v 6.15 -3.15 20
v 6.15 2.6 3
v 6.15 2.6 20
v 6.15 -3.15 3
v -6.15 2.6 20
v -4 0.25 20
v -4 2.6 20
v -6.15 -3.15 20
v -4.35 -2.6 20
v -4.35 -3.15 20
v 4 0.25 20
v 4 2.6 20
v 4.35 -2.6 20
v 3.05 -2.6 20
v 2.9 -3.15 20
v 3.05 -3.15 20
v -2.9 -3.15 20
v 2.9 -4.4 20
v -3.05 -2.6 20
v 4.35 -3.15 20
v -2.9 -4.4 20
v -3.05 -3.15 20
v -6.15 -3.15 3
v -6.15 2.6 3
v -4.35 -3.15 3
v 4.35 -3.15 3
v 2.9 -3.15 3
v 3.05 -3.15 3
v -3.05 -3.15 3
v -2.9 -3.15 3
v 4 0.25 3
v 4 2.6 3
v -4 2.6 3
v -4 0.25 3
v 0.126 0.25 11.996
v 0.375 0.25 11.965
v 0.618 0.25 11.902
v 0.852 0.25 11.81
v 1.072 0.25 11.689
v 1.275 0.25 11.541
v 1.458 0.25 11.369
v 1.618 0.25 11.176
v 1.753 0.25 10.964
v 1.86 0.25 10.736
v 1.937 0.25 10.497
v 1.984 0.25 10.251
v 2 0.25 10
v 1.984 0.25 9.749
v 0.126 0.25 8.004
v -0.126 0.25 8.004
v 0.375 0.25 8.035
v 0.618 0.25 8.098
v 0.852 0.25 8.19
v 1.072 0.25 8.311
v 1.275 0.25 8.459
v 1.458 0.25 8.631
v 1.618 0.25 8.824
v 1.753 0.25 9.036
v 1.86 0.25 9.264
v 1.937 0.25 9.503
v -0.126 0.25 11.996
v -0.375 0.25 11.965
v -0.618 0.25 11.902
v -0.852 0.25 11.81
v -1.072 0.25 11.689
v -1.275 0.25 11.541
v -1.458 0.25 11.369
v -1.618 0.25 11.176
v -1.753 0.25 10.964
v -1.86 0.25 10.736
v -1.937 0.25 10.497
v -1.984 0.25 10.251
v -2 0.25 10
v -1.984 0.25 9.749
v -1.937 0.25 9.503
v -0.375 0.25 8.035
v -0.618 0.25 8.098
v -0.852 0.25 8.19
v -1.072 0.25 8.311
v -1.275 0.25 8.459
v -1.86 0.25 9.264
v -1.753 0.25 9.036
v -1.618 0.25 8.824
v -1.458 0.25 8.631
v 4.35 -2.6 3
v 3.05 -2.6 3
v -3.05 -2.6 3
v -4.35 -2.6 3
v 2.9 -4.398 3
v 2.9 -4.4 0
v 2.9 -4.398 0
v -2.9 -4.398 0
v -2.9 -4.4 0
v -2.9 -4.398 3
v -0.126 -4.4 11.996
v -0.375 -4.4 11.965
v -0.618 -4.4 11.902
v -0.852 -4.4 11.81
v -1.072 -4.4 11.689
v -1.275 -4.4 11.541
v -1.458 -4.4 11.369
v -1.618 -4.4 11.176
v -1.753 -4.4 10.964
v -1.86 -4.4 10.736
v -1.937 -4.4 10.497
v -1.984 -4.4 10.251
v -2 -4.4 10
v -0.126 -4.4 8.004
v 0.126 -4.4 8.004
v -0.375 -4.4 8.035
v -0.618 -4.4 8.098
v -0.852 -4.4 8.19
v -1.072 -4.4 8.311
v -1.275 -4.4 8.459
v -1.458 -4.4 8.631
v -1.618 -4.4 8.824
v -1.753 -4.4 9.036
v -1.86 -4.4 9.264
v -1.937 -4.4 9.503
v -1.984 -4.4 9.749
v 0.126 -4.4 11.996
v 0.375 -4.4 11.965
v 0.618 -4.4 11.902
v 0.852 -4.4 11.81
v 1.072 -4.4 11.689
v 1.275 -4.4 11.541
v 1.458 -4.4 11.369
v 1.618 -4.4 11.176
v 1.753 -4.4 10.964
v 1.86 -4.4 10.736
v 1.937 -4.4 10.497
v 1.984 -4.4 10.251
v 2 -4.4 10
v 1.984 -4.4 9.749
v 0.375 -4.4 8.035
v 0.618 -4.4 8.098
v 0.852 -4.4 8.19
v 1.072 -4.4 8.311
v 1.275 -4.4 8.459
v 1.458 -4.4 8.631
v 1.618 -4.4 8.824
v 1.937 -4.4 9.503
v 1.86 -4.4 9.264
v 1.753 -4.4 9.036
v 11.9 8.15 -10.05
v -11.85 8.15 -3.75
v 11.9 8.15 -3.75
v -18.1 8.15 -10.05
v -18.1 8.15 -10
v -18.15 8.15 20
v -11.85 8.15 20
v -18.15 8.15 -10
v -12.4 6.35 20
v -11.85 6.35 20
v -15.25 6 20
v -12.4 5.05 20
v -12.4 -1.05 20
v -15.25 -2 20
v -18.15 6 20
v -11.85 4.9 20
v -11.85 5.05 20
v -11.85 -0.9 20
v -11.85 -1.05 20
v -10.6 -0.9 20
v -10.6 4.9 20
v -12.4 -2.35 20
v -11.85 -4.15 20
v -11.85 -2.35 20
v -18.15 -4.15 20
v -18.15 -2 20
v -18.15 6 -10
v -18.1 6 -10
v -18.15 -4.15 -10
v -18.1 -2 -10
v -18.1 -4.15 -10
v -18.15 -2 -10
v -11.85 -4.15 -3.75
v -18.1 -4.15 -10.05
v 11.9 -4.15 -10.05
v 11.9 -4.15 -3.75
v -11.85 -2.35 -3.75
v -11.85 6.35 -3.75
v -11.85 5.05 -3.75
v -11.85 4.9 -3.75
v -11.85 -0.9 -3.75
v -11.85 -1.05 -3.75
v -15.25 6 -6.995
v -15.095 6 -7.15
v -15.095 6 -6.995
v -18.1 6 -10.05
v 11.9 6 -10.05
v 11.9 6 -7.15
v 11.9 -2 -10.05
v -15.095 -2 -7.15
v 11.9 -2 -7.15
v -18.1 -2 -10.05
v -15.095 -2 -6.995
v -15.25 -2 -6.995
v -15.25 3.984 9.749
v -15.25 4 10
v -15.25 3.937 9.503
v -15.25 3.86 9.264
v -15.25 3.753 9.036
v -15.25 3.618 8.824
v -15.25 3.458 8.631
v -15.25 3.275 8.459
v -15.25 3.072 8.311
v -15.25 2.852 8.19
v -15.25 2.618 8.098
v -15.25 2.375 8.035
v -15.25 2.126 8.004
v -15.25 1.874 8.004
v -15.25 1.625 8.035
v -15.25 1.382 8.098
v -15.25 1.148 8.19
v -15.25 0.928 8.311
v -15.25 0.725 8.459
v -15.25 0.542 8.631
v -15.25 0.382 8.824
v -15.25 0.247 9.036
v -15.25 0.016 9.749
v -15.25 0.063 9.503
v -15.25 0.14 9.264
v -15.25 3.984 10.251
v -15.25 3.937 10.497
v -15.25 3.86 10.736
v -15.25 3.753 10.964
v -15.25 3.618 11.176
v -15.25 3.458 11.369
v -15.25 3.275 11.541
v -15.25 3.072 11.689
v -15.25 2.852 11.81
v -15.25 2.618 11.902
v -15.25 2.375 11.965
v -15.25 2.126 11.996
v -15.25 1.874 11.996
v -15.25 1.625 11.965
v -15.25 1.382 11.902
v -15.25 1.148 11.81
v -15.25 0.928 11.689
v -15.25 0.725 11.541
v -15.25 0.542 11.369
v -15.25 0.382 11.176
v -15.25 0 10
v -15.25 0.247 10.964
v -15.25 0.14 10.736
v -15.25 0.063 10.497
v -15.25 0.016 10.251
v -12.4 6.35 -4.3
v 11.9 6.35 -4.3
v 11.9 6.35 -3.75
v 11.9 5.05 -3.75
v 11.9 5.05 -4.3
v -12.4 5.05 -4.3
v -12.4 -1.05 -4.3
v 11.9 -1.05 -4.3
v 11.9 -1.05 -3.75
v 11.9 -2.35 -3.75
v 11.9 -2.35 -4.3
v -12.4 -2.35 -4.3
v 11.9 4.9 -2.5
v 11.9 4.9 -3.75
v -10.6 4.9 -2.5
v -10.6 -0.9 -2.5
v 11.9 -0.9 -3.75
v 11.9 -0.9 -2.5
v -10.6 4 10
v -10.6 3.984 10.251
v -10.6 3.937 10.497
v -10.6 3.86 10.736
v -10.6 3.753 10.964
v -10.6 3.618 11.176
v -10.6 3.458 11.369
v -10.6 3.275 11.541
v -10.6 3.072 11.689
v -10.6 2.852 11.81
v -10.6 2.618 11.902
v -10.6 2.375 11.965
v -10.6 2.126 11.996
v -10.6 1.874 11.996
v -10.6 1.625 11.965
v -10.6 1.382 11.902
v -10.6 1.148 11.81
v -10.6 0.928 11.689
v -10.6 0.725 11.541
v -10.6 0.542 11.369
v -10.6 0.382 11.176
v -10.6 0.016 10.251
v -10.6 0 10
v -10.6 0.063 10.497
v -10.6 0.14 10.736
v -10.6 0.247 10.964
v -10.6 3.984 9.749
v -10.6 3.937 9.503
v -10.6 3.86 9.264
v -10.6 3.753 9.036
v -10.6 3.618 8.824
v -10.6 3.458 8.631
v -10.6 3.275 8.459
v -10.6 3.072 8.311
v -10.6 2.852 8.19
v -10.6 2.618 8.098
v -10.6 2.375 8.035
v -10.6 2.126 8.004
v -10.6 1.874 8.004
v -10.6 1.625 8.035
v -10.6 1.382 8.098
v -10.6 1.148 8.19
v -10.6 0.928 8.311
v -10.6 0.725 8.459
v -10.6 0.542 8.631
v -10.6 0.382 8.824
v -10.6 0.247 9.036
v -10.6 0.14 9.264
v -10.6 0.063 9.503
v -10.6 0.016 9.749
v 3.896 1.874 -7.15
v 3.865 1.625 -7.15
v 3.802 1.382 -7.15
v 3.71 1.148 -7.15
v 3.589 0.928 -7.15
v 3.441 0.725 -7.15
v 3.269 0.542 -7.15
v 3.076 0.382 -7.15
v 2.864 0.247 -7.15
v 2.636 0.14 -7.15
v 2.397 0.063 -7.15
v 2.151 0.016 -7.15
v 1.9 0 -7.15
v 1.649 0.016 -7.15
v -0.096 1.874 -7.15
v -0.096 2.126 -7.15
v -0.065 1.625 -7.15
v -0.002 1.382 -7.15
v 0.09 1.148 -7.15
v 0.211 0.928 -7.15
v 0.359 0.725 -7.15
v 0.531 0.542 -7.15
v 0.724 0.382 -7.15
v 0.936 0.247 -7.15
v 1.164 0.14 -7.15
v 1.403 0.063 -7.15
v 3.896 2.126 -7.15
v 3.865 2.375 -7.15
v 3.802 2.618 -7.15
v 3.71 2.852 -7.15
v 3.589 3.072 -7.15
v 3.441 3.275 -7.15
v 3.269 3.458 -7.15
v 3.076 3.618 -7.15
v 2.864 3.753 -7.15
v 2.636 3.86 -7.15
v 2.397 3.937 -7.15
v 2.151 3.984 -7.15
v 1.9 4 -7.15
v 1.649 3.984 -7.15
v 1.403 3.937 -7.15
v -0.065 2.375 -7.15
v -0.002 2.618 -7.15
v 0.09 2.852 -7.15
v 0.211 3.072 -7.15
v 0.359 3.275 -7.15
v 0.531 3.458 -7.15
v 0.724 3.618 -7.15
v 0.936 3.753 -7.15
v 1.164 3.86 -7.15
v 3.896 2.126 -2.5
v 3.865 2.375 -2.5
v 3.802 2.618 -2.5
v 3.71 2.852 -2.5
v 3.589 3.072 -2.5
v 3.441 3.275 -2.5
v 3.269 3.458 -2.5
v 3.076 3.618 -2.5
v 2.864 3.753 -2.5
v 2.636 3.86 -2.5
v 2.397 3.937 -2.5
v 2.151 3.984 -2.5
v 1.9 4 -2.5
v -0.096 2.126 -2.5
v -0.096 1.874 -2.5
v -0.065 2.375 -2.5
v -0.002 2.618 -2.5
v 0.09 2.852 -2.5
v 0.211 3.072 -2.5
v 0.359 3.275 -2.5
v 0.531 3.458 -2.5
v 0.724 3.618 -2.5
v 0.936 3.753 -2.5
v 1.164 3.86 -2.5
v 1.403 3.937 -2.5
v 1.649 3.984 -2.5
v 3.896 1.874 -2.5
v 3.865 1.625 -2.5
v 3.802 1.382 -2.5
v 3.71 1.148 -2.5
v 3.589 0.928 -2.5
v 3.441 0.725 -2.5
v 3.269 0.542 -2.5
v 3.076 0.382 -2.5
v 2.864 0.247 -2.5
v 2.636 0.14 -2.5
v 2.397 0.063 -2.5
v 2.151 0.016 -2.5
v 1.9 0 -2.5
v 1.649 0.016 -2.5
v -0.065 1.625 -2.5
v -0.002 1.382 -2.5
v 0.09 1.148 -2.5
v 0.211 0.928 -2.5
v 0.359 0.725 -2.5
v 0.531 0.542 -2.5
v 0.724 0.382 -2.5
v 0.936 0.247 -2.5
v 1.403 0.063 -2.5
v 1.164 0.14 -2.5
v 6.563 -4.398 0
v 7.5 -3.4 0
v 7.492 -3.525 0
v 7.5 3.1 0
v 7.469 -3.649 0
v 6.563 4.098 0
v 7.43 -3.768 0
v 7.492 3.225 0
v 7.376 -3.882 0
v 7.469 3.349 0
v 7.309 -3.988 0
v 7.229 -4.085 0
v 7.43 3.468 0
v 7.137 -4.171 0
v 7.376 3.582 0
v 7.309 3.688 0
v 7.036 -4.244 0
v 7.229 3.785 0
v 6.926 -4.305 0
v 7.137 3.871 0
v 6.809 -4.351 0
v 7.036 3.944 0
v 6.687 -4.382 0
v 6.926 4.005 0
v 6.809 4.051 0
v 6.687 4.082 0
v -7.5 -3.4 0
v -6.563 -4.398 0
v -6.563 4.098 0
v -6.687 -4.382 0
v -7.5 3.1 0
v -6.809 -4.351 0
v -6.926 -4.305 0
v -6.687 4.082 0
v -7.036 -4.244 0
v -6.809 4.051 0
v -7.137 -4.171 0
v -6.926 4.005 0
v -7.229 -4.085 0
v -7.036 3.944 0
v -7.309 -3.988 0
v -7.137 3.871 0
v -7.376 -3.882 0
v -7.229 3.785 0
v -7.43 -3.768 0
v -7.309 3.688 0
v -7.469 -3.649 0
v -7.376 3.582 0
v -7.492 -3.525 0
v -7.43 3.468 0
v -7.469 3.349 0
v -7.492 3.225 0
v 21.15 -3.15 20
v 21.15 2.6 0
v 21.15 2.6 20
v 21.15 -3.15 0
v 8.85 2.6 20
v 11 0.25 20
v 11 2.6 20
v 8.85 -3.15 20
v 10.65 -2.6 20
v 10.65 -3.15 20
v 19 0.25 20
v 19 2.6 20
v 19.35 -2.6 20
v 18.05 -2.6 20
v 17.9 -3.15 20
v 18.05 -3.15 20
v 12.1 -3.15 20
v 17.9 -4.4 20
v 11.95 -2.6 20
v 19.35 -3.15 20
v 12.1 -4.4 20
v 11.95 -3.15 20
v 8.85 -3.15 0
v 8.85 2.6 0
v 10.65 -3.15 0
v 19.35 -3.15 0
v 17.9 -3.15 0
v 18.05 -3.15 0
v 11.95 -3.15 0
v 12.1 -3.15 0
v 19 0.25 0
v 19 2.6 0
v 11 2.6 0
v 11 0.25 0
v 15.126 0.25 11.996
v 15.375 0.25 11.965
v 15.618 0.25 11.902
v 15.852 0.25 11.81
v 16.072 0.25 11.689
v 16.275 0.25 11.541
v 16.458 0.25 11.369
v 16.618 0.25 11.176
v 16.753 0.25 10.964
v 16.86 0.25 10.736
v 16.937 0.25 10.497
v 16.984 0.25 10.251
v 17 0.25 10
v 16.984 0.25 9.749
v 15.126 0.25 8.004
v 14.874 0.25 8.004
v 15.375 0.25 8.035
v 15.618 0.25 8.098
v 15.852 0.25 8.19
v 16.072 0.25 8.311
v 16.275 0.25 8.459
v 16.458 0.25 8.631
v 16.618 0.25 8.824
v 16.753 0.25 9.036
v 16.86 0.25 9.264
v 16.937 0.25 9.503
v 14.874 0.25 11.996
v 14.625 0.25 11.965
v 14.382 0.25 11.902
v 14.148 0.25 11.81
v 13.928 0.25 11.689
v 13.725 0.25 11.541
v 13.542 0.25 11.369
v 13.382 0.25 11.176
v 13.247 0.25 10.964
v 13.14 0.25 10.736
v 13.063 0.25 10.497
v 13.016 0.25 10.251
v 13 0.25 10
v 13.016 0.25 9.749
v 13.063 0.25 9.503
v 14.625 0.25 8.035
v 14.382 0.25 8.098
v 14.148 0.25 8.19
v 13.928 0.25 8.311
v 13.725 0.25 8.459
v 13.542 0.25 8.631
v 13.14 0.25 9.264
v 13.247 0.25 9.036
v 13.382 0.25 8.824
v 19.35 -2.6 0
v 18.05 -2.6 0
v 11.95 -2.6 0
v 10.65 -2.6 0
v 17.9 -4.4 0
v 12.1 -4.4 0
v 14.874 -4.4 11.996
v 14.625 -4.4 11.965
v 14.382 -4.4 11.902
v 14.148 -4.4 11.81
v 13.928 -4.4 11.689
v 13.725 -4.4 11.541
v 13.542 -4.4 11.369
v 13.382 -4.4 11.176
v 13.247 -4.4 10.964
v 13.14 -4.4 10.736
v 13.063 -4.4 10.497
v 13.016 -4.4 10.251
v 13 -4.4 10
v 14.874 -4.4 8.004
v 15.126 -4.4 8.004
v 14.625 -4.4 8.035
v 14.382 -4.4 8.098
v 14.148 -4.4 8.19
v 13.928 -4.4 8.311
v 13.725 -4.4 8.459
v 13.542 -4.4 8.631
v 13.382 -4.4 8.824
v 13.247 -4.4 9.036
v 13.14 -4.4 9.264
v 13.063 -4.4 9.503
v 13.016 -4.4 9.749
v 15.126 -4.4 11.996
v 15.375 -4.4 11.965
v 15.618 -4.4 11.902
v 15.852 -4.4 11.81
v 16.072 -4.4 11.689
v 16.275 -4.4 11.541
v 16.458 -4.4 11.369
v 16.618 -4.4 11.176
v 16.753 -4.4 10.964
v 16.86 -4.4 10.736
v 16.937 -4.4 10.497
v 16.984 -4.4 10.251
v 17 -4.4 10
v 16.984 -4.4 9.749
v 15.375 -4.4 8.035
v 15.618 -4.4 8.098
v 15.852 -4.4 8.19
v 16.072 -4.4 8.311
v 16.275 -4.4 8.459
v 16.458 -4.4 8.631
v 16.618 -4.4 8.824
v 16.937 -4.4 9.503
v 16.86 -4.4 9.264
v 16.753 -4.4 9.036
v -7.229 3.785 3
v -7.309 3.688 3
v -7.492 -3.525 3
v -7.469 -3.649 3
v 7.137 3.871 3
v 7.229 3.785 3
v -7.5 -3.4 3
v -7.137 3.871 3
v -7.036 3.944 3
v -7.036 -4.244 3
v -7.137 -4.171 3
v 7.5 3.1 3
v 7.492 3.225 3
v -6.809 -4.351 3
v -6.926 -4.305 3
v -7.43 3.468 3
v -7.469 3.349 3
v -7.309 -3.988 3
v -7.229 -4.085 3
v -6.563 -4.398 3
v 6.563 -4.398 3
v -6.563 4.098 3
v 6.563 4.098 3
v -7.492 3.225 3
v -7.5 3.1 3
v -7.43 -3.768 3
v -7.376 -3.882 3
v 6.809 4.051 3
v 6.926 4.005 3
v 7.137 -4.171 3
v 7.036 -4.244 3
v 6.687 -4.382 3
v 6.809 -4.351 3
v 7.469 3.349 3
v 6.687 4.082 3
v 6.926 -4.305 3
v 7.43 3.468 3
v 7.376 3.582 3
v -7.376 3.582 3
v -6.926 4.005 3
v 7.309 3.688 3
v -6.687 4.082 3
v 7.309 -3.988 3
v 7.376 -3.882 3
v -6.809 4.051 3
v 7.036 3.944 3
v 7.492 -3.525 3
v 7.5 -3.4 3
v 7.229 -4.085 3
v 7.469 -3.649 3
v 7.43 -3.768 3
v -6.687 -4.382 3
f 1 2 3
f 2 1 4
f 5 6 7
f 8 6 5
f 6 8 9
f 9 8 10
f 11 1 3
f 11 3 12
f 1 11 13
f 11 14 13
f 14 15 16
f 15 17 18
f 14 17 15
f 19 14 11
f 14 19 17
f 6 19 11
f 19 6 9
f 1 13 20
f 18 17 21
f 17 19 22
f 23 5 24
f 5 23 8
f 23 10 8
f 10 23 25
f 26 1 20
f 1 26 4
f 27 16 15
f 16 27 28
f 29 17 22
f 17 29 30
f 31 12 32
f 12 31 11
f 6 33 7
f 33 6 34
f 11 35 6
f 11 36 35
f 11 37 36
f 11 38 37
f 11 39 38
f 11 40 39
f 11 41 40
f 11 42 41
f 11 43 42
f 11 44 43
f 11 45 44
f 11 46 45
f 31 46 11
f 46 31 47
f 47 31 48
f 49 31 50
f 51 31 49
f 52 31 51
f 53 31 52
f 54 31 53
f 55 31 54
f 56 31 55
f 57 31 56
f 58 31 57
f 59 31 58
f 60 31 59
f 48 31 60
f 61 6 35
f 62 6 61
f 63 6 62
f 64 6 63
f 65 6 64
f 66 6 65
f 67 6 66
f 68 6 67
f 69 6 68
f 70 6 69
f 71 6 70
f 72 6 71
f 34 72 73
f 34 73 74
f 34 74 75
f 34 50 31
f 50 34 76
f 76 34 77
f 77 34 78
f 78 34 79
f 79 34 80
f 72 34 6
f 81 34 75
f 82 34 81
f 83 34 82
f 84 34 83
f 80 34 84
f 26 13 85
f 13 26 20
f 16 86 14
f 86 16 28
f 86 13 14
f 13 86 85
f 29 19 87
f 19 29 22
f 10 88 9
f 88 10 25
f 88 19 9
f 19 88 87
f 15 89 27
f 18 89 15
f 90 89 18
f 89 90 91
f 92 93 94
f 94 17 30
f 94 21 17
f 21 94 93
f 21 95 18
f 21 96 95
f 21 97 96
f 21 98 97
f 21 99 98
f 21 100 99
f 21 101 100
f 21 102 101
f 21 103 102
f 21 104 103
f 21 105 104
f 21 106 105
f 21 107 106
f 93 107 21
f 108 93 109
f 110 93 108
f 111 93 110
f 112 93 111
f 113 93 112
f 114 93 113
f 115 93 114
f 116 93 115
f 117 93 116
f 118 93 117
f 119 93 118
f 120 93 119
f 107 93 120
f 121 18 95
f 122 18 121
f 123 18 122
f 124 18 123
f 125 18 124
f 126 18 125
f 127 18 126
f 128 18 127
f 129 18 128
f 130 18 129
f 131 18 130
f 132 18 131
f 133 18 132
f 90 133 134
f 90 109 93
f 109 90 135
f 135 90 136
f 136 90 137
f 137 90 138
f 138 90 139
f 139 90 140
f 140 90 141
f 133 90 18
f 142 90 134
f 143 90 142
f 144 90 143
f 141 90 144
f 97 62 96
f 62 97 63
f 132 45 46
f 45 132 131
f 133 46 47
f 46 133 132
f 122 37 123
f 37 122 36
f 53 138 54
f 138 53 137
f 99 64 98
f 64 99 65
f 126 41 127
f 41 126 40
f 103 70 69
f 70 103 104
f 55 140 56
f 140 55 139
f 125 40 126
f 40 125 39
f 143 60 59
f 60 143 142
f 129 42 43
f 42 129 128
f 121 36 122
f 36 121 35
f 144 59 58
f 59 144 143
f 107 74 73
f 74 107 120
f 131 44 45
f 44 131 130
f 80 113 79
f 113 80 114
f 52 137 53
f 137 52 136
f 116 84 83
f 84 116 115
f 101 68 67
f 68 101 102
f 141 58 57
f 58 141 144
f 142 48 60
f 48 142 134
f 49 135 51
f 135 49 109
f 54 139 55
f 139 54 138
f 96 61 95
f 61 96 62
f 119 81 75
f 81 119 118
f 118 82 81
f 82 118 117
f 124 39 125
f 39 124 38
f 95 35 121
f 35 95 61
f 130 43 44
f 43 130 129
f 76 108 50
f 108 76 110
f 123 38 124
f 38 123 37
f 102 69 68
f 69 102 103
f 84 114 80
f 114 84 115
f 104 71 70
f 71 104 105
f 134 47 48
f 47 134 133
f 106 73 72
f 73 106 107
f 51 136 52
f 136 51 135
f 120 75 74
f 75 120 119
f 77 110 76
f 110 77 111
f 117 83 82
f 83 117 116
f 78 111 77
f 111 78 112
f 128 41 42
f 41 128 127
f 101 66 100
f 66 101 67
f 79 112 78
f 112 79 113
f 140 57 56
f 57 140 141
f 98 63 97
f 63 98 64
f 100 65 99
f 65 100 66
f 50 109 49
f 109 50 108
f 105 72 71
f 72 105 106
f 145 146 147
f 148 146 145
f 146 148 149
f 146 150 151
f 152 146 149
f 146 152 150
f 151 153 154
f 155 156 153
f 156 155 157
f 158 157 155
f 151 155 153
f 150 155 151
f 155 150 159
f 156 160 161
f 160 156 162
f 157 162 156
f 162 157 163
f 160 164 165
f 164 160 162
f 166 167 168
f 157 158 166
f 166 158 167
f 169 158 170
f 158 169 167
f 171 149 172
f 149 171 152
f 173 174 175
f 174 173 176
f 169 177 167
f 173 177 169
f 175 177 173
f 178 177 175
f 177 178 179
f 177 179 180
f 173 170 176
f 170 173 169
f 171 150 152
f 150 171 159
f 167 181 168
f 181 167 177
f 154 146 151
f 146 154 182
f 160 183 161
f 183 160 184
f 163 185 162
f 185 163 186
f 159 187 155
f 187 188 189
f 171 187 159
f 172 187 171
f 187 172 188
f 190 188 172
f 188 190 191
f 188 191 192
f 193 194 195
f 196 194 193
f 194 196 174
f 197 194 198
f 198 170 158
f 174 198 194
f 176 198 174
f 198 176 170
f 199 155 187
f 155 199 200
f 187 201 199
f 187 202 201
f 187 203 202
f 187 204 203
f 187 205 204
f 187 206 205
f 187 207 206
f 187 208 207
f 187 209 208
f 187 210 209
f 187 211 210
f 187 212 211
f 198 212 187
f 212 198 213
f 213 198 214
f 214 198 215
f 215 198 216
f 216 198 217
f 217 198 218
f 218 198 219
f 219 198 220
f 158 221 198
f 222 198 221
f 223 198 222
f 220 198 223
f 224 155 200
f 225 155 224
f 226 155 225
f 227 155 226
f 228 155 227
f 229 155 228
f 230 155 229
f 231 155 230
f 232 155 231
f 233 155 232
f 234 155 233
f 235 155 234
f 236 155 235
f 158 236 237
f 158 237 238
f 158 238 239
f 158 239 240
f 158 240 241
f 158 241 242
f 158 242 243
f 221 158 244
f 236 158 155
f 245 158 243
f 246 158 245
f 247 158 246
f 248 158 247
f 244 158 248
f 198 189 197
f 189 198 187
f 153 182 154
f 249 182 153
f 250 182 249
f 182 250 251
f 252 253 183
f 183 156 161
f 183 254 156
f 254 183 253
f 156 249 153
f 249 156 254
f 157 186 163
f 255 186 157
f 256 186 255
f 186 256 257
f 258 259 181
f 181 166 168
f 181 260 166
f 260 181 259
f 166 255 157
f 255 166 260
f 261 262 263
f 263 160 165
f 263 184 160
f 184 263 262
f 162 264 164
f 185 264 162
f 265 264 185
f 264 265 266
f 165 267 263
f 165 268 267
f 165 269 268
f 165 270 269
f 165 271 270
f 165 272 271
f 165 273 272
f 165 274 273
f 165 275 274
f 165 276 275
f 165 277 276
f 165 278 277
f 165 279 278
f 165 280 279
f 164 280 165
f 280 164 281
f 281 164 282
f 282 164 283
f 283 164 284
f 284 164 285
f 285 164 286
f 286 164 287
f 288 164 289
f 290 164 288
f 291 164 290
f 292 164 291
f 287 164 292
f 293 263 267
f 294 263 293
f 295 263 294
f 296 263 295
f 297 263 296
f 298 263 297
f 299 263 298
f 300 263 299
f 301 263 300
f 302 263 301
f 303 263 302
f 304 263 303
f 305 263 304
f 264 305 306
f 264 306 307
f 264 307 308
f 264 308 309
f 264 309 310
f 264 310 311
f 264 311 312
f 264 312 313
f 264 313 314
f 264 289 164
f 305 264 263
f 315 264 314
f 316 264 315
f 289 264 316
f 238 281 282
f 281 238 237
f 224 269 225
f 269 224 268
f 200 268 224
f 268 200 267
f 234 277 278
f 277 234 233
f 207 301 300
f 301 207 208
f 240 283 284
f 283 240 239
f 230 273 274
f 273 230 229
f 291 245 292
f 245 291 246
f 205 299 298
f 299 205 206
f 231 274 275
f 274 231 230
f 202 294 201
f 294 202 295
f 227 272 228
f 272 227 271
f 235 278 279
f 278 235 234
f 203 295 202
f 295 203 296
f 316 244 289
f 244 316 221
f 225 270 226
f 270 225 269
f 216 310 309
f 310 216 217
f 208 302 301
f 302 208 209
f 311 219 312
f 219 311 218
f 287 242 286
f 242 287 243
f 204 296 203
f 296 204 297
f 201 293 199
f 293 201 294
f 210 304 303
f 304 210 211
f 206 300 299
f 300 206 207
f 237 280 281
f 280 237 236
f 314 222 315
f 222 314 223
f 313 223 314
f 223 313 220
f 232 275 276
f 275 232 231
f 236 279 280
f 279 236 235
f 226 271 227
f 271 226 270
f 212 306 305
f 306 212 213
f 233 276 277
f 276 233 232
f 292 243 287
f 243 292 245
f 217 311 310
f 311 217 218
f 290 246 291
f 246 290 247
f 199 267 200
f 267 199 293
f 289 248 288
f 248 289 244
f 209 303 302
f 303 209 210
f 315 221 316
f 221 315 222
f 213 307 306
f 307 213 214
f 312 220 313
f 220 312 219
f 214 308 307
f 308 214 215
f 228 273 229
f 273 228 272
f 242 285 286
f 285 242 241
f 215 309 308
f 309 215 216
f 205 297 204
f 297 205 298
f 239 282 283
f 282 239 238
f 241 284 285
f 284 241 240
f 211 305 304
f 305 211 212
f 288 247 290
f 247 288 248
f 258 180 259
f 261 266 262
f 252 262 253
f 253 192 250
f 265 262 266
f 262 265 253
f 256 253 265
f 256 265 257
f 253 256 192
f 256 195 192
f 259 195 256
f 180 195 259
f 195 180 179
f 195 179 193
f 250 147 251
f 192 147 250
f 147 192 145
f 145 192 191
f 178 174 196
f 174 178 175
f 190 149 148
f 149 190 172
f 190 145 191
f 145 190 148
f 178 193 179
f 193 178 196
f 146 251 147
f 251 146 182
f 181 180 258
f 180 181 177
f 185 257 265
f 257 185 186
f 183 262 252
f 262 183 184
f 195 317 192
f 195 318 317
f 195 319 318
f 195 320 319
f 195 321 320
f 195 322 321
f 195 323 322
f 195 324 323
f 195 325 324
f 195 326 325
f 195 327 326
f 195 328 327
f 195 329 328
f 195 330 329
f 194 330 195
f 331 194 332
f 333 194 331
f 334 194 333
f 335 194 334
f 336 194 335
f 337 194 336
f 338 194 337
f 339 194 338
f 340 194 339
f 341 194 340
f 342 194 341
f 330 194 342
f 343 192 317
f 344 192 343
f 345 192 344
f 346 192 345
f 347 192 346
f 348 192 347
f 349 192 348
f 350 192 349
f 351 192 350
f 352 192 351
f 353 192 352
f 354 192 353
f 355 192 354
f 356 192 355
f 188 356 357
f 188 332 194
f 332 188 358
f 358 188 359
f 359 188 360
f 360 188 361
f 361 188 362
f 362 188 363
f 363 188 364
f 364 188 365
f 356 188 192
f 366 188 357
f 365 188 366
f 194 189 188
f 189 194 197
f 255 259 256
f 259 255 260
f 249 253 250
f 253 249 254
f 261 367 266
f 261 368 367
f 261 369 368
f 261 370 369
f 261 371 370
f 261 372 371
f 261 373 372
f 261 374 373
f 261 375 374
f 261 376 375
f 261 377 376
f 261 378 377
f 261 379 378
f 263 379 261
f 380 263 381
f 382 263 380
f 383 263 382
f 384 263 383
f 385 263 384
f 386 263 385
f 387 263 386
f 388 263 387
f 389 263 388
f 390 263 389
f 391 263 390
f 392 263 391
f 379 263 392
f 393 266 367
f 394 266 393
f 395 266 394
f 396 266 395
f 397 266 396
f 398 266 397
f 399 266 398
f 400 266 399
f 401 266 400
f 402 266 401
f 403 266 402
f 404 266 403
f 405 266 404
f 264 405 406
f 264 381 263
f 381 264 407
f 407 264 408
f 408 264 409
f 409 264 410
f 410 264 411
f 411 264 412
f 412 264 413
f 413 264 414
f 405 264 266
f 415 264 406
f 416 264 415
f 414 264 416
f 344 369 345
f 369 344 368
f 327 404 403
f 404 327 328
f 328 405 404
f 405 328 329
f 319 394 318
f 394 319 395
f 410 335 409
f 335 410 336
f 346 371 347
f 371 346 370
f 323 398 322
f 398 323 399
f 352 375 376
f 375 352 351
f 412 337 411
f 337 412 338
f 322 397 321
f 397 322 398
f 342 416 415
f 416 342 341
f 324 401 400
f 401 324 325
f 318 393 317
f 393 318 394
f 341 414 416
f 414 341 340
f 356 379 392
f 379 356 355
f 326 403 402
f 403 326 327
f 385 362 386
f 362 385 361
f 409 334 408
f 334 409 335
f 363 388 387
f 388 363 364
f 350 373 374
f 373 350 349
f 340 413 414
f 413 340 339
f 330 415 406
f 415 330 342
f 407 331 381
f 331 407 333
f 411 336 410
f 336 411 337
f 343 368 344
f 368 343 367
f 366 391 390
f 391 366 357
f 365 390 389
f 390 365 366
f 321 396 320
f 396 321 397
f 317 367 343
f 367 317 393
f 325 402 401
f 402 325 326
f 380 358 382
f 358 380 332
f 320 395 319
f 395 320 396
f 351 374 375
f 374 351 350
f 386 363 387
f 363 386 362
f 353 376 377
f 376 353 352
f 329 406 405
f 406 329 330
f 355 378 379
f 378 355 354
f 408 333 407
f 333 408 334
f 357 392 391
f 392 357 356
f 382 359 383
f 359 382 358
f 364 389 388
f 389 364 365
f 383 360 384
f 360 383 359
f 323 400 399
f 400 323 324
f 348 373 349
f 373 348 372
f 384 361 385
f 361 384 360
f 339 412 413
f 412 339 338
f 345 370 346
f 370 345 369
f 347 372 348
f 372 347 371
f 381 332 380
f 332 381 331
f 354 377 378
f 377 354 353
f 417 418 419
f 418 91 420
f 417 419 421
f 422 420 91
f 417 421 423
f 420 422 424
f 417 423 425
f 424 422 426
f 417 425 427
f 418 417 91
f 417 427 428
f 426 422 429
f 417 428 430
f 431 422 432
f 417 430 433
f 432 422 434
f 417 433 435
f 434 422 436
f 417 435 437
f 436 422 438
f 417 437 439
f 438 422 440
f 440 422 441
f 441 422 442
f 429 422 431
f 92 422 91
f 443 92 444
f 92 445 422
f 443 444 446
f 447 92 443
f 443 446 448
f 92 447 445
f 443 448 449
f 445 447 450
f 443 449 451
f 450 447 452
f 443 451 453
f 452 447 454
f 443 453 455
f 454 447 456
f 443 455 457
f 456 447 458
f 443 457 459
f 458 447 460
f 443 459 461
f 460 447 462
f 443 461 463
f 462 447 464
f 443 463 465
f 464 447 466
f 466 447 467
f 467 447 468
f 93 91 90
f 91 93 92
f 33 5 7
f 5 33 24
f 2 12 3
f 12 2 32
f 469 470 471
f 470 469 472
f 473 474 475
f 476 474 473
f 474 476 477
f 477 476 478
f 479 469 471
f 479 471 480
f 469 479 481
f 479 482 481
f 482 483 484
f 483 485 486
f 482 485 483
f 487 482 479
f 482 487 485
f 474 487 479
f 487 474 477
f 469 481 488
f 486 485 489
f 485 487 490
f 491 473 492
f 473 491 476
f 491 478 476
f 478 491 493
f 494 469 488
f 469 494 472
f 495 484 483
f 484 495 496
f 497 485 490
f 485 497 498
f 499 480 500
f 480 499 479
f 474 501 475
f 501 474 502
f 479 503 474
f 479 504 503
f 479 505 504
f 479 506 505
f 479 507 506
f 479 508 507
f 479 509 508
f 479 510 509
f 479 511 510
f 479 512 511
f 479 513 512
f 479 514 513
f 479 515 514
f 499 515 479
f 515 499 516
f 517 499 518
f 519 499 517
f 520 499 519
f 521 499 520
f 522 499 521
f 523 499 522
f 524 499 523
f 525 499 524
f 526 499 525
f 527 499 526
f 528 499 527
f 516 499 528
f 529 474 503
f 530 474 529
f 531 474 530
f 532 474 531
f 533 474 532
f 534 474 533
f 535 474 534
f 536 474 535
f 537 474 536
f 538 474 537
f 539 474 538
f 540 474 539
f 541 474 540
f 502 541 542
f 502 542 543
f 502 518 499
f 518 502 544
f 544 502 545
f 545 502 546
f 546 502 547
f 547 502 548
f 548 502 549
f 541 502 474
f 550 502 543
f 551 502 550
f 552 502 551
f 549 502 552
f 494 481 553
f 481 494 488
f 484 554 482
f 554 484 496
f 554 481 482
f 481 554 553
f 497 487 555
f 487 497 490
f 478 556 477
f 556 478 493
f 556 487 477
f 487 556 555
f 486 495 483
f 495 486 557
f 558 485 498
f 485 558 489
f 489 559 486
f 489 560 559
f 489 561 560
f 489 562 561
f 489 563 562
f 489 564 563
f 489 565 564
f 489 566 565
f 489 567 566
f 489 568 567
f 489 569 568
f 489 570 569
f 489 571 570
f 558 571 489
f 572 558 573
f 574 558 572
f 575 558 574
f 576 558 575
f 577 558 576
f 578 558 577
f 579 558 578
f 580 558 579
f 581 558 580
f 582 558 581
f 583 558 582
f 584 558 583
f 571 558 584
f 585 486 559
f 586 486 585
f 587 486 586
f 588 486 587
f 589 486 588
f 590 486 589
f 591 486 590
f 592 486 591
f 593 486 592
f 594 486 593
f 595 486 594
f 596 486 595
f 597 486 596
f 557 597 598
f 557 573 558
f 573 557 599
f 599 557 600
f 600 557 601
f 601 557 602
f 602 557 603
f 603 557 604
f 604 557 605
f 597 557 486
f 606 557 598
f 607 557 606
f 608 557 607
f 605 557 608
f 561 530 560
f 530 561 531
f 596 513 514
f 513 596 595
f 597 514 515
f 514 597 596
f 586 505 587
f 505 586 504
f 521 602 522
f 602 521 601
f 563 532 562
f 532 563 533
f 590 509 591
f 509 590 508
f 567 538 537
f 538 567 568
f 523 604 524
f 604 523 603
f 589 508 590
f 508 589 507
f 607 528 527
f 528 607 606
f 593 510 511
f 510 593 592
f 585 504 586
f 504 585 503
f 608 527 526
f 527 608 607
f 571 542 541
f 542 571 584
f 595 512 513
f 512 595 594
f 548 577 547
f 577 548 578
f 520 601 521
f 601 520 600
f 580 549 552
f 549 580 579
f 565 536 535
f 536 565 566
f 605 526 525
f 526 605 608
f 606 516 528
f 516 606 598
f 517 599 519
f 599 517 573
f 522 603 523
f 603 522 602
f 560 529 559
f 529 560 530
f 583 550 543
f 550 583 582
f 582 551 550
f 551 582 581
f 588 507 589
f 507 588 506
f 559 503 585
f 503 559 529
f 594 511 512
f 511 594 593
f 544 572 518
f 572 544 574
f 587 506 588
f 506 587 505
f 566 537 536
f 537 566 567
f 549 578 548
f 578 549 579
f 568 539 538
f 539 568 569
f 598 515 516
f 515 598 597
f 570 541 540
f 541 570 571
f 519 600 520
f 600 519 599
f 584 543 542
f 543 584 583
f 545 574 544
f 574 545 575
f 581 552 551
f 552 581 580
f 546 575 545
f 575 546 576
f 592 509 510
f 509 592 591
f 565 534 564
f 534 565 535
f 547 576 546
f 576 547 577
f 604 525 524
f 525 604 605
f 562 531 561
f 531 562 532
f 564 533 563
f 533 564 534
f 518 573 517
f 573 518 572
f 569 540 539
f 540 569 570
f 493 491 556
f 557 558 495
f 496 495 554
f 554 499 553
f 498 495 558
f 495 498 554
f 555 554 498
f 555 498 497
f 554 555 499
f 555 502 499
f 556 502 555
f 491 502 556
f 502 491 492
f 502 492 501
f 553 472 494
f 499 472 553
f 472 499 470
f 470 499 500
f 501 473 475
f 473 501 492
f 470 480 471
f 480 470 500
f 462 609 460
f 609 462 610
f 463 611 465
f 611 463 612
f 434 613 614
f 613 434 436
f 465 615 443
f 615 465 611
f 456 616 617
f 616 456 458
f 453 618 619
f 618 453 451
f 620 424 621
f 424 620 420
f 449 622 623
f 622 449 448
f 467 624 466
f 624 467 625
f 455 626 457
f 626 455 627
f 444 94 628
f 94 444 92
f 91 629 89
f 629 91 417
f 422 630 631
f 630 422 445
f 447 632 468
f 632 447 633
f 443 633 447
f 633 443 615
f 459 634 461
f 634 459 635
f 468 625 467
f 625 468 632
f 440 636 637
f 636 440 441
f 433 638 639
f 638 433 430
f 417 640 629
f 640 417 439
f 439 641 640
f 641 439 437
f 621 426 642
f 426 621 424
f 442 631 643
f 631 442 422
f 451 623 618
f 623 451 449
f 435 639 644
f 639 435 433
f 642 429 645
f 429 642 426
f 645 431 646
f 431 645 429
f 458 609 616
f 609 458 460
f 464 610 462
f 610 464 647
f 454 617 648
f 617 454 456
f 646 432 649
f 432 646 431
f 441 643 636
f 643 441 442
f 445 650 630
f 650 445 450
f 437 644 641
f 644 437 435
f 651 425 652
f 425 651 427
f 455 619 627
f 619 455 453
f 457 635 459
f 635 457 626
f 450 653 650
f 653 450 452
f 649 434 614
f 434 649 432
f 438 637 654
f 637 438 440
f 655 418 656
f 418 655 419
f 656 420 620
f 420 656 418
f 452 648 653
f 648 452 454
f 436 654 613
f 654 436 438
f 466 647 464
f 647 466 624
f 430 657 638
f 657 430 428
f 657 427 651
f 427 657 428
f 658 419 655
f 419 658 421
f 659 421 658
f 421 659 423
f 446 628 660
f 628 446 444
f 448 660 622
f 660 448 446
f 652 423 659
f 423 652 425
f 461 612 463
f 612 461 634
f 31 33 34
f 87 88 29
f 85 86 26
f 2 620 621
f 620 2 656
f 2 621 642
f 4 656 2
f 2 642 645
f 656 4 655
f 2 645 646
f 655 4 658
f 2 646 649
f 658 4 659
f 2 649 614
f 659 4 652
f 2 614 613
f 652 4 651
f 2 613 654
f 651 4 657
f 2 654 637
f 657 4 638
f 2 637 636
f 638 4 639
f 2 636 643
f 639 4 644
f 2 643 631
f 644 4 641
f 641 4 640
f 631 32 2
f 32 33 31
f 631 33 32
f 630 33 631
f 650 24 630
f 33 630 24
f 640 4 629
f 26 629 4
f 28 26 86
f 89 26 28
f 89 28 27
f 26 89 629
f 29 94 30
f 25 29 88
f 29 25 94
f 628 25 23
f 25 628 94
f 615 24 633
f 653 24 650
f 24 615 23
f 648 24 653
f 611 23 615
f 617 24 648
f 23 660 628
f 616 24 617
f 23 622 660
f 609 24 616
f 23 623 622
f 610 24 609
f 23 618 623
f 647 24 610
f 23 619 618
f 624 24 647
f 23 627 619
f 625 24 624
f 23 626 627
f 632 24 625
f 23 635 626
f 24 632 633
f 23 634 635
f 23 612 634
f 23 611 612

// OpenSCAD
$fn = 50 * 1;

// Draw corner piece
draw_corner_piece = "yes"; // [yes, no]

// Draw end stop
draw_end_stop = "yes"; // [yes, no]

// Draw straight stop
draw_straight_piece = "yes"; // [yes, no]


module roundedRect(size, radius) {
  x = size[0];
  y = size[1];
  z = size[2];

  linear_extrude(height=z)
  hull() {
  translate([radius, radius, 0])
  circle(r=radius);

  translate([x - radius, radius, 0])
  circle(r=radius);

  translate([x - radius, y - radius, 0])
  circle(r=radius);

  translate([radius, y - radius, 0])
  circle(r=radius);
  }
}

module part() {
  difference() {
    translate([0, 0, 5])
      cube([12.3, 6.3, 30], center=true);
    translate([0, 3.3/2+0.1, 5])
      cube([8, 3, 30.1], center=true);
    translate([0, 0, -10+3/2])
      cube([8, 6.3+1, 3.01], center=true);
    translate([12.3/2 - 1.3/2 - 1.8, -6.3/2+0.5/2, 3+5])
      cube([1.3, 0.5 + 0.1, 25], center=true);
    translate([-12.3/2 + 1.3/2 + 1.8, -6.3/2+0.5/2, 3+5])
      cube([1.3, 0.5 + 0.1, 25], center=true);
  }
  translate([-5.8/2, -4.4, -5])
    cube([5.8, 1.4, 25]); 
}

module part_with_hole() {
  difference() {
    part();
  translate([0, 10, 10])
  rotate([90, 0, 0])
    cylinder(r=4/2, h=20);
  }
}

module corner() {
  part_with_hole();
  translate([0,-6.9,-6.9])
    rotate([-90, 0, 180]) part_with_hole();
}

module straight() {
  difference() {
    part_with_hole();
    translate([-10, -10, -12])
      cube([20, 20, 12]);
    // The straight part is a little slimmer, as to make it easier to move
    // the aluminium piece.
    translate([-10, 3.2-0.6, -1])
      cube([20, 20, 40]);
  }
}

module end_stop() {
  difference() {
    part_with_hole();
    translate([-10, -10, -12])
      cube([20, 20, 12]);
    // The straight part is a little slimmer, as to make it easier to move
    // the aluminium piece.
    translate([-10, 3.2-0.6, -1])
      cube([20, 20, 40]);
  }
  translate([-7.5,-4.4,0])
    roundedRect([15,8.5,3], radius=1);
}



if (draw_corner_piece=="yes") {
  translate([-15, 2, 0])
    rotate([0, 0, 90])
      corner();
}
if (draw_straight_piece=="yes") {
  translate([15, 0, 0])
    straight();
}
if (draw_end_stop=="yes") {
  end_stop();
}
